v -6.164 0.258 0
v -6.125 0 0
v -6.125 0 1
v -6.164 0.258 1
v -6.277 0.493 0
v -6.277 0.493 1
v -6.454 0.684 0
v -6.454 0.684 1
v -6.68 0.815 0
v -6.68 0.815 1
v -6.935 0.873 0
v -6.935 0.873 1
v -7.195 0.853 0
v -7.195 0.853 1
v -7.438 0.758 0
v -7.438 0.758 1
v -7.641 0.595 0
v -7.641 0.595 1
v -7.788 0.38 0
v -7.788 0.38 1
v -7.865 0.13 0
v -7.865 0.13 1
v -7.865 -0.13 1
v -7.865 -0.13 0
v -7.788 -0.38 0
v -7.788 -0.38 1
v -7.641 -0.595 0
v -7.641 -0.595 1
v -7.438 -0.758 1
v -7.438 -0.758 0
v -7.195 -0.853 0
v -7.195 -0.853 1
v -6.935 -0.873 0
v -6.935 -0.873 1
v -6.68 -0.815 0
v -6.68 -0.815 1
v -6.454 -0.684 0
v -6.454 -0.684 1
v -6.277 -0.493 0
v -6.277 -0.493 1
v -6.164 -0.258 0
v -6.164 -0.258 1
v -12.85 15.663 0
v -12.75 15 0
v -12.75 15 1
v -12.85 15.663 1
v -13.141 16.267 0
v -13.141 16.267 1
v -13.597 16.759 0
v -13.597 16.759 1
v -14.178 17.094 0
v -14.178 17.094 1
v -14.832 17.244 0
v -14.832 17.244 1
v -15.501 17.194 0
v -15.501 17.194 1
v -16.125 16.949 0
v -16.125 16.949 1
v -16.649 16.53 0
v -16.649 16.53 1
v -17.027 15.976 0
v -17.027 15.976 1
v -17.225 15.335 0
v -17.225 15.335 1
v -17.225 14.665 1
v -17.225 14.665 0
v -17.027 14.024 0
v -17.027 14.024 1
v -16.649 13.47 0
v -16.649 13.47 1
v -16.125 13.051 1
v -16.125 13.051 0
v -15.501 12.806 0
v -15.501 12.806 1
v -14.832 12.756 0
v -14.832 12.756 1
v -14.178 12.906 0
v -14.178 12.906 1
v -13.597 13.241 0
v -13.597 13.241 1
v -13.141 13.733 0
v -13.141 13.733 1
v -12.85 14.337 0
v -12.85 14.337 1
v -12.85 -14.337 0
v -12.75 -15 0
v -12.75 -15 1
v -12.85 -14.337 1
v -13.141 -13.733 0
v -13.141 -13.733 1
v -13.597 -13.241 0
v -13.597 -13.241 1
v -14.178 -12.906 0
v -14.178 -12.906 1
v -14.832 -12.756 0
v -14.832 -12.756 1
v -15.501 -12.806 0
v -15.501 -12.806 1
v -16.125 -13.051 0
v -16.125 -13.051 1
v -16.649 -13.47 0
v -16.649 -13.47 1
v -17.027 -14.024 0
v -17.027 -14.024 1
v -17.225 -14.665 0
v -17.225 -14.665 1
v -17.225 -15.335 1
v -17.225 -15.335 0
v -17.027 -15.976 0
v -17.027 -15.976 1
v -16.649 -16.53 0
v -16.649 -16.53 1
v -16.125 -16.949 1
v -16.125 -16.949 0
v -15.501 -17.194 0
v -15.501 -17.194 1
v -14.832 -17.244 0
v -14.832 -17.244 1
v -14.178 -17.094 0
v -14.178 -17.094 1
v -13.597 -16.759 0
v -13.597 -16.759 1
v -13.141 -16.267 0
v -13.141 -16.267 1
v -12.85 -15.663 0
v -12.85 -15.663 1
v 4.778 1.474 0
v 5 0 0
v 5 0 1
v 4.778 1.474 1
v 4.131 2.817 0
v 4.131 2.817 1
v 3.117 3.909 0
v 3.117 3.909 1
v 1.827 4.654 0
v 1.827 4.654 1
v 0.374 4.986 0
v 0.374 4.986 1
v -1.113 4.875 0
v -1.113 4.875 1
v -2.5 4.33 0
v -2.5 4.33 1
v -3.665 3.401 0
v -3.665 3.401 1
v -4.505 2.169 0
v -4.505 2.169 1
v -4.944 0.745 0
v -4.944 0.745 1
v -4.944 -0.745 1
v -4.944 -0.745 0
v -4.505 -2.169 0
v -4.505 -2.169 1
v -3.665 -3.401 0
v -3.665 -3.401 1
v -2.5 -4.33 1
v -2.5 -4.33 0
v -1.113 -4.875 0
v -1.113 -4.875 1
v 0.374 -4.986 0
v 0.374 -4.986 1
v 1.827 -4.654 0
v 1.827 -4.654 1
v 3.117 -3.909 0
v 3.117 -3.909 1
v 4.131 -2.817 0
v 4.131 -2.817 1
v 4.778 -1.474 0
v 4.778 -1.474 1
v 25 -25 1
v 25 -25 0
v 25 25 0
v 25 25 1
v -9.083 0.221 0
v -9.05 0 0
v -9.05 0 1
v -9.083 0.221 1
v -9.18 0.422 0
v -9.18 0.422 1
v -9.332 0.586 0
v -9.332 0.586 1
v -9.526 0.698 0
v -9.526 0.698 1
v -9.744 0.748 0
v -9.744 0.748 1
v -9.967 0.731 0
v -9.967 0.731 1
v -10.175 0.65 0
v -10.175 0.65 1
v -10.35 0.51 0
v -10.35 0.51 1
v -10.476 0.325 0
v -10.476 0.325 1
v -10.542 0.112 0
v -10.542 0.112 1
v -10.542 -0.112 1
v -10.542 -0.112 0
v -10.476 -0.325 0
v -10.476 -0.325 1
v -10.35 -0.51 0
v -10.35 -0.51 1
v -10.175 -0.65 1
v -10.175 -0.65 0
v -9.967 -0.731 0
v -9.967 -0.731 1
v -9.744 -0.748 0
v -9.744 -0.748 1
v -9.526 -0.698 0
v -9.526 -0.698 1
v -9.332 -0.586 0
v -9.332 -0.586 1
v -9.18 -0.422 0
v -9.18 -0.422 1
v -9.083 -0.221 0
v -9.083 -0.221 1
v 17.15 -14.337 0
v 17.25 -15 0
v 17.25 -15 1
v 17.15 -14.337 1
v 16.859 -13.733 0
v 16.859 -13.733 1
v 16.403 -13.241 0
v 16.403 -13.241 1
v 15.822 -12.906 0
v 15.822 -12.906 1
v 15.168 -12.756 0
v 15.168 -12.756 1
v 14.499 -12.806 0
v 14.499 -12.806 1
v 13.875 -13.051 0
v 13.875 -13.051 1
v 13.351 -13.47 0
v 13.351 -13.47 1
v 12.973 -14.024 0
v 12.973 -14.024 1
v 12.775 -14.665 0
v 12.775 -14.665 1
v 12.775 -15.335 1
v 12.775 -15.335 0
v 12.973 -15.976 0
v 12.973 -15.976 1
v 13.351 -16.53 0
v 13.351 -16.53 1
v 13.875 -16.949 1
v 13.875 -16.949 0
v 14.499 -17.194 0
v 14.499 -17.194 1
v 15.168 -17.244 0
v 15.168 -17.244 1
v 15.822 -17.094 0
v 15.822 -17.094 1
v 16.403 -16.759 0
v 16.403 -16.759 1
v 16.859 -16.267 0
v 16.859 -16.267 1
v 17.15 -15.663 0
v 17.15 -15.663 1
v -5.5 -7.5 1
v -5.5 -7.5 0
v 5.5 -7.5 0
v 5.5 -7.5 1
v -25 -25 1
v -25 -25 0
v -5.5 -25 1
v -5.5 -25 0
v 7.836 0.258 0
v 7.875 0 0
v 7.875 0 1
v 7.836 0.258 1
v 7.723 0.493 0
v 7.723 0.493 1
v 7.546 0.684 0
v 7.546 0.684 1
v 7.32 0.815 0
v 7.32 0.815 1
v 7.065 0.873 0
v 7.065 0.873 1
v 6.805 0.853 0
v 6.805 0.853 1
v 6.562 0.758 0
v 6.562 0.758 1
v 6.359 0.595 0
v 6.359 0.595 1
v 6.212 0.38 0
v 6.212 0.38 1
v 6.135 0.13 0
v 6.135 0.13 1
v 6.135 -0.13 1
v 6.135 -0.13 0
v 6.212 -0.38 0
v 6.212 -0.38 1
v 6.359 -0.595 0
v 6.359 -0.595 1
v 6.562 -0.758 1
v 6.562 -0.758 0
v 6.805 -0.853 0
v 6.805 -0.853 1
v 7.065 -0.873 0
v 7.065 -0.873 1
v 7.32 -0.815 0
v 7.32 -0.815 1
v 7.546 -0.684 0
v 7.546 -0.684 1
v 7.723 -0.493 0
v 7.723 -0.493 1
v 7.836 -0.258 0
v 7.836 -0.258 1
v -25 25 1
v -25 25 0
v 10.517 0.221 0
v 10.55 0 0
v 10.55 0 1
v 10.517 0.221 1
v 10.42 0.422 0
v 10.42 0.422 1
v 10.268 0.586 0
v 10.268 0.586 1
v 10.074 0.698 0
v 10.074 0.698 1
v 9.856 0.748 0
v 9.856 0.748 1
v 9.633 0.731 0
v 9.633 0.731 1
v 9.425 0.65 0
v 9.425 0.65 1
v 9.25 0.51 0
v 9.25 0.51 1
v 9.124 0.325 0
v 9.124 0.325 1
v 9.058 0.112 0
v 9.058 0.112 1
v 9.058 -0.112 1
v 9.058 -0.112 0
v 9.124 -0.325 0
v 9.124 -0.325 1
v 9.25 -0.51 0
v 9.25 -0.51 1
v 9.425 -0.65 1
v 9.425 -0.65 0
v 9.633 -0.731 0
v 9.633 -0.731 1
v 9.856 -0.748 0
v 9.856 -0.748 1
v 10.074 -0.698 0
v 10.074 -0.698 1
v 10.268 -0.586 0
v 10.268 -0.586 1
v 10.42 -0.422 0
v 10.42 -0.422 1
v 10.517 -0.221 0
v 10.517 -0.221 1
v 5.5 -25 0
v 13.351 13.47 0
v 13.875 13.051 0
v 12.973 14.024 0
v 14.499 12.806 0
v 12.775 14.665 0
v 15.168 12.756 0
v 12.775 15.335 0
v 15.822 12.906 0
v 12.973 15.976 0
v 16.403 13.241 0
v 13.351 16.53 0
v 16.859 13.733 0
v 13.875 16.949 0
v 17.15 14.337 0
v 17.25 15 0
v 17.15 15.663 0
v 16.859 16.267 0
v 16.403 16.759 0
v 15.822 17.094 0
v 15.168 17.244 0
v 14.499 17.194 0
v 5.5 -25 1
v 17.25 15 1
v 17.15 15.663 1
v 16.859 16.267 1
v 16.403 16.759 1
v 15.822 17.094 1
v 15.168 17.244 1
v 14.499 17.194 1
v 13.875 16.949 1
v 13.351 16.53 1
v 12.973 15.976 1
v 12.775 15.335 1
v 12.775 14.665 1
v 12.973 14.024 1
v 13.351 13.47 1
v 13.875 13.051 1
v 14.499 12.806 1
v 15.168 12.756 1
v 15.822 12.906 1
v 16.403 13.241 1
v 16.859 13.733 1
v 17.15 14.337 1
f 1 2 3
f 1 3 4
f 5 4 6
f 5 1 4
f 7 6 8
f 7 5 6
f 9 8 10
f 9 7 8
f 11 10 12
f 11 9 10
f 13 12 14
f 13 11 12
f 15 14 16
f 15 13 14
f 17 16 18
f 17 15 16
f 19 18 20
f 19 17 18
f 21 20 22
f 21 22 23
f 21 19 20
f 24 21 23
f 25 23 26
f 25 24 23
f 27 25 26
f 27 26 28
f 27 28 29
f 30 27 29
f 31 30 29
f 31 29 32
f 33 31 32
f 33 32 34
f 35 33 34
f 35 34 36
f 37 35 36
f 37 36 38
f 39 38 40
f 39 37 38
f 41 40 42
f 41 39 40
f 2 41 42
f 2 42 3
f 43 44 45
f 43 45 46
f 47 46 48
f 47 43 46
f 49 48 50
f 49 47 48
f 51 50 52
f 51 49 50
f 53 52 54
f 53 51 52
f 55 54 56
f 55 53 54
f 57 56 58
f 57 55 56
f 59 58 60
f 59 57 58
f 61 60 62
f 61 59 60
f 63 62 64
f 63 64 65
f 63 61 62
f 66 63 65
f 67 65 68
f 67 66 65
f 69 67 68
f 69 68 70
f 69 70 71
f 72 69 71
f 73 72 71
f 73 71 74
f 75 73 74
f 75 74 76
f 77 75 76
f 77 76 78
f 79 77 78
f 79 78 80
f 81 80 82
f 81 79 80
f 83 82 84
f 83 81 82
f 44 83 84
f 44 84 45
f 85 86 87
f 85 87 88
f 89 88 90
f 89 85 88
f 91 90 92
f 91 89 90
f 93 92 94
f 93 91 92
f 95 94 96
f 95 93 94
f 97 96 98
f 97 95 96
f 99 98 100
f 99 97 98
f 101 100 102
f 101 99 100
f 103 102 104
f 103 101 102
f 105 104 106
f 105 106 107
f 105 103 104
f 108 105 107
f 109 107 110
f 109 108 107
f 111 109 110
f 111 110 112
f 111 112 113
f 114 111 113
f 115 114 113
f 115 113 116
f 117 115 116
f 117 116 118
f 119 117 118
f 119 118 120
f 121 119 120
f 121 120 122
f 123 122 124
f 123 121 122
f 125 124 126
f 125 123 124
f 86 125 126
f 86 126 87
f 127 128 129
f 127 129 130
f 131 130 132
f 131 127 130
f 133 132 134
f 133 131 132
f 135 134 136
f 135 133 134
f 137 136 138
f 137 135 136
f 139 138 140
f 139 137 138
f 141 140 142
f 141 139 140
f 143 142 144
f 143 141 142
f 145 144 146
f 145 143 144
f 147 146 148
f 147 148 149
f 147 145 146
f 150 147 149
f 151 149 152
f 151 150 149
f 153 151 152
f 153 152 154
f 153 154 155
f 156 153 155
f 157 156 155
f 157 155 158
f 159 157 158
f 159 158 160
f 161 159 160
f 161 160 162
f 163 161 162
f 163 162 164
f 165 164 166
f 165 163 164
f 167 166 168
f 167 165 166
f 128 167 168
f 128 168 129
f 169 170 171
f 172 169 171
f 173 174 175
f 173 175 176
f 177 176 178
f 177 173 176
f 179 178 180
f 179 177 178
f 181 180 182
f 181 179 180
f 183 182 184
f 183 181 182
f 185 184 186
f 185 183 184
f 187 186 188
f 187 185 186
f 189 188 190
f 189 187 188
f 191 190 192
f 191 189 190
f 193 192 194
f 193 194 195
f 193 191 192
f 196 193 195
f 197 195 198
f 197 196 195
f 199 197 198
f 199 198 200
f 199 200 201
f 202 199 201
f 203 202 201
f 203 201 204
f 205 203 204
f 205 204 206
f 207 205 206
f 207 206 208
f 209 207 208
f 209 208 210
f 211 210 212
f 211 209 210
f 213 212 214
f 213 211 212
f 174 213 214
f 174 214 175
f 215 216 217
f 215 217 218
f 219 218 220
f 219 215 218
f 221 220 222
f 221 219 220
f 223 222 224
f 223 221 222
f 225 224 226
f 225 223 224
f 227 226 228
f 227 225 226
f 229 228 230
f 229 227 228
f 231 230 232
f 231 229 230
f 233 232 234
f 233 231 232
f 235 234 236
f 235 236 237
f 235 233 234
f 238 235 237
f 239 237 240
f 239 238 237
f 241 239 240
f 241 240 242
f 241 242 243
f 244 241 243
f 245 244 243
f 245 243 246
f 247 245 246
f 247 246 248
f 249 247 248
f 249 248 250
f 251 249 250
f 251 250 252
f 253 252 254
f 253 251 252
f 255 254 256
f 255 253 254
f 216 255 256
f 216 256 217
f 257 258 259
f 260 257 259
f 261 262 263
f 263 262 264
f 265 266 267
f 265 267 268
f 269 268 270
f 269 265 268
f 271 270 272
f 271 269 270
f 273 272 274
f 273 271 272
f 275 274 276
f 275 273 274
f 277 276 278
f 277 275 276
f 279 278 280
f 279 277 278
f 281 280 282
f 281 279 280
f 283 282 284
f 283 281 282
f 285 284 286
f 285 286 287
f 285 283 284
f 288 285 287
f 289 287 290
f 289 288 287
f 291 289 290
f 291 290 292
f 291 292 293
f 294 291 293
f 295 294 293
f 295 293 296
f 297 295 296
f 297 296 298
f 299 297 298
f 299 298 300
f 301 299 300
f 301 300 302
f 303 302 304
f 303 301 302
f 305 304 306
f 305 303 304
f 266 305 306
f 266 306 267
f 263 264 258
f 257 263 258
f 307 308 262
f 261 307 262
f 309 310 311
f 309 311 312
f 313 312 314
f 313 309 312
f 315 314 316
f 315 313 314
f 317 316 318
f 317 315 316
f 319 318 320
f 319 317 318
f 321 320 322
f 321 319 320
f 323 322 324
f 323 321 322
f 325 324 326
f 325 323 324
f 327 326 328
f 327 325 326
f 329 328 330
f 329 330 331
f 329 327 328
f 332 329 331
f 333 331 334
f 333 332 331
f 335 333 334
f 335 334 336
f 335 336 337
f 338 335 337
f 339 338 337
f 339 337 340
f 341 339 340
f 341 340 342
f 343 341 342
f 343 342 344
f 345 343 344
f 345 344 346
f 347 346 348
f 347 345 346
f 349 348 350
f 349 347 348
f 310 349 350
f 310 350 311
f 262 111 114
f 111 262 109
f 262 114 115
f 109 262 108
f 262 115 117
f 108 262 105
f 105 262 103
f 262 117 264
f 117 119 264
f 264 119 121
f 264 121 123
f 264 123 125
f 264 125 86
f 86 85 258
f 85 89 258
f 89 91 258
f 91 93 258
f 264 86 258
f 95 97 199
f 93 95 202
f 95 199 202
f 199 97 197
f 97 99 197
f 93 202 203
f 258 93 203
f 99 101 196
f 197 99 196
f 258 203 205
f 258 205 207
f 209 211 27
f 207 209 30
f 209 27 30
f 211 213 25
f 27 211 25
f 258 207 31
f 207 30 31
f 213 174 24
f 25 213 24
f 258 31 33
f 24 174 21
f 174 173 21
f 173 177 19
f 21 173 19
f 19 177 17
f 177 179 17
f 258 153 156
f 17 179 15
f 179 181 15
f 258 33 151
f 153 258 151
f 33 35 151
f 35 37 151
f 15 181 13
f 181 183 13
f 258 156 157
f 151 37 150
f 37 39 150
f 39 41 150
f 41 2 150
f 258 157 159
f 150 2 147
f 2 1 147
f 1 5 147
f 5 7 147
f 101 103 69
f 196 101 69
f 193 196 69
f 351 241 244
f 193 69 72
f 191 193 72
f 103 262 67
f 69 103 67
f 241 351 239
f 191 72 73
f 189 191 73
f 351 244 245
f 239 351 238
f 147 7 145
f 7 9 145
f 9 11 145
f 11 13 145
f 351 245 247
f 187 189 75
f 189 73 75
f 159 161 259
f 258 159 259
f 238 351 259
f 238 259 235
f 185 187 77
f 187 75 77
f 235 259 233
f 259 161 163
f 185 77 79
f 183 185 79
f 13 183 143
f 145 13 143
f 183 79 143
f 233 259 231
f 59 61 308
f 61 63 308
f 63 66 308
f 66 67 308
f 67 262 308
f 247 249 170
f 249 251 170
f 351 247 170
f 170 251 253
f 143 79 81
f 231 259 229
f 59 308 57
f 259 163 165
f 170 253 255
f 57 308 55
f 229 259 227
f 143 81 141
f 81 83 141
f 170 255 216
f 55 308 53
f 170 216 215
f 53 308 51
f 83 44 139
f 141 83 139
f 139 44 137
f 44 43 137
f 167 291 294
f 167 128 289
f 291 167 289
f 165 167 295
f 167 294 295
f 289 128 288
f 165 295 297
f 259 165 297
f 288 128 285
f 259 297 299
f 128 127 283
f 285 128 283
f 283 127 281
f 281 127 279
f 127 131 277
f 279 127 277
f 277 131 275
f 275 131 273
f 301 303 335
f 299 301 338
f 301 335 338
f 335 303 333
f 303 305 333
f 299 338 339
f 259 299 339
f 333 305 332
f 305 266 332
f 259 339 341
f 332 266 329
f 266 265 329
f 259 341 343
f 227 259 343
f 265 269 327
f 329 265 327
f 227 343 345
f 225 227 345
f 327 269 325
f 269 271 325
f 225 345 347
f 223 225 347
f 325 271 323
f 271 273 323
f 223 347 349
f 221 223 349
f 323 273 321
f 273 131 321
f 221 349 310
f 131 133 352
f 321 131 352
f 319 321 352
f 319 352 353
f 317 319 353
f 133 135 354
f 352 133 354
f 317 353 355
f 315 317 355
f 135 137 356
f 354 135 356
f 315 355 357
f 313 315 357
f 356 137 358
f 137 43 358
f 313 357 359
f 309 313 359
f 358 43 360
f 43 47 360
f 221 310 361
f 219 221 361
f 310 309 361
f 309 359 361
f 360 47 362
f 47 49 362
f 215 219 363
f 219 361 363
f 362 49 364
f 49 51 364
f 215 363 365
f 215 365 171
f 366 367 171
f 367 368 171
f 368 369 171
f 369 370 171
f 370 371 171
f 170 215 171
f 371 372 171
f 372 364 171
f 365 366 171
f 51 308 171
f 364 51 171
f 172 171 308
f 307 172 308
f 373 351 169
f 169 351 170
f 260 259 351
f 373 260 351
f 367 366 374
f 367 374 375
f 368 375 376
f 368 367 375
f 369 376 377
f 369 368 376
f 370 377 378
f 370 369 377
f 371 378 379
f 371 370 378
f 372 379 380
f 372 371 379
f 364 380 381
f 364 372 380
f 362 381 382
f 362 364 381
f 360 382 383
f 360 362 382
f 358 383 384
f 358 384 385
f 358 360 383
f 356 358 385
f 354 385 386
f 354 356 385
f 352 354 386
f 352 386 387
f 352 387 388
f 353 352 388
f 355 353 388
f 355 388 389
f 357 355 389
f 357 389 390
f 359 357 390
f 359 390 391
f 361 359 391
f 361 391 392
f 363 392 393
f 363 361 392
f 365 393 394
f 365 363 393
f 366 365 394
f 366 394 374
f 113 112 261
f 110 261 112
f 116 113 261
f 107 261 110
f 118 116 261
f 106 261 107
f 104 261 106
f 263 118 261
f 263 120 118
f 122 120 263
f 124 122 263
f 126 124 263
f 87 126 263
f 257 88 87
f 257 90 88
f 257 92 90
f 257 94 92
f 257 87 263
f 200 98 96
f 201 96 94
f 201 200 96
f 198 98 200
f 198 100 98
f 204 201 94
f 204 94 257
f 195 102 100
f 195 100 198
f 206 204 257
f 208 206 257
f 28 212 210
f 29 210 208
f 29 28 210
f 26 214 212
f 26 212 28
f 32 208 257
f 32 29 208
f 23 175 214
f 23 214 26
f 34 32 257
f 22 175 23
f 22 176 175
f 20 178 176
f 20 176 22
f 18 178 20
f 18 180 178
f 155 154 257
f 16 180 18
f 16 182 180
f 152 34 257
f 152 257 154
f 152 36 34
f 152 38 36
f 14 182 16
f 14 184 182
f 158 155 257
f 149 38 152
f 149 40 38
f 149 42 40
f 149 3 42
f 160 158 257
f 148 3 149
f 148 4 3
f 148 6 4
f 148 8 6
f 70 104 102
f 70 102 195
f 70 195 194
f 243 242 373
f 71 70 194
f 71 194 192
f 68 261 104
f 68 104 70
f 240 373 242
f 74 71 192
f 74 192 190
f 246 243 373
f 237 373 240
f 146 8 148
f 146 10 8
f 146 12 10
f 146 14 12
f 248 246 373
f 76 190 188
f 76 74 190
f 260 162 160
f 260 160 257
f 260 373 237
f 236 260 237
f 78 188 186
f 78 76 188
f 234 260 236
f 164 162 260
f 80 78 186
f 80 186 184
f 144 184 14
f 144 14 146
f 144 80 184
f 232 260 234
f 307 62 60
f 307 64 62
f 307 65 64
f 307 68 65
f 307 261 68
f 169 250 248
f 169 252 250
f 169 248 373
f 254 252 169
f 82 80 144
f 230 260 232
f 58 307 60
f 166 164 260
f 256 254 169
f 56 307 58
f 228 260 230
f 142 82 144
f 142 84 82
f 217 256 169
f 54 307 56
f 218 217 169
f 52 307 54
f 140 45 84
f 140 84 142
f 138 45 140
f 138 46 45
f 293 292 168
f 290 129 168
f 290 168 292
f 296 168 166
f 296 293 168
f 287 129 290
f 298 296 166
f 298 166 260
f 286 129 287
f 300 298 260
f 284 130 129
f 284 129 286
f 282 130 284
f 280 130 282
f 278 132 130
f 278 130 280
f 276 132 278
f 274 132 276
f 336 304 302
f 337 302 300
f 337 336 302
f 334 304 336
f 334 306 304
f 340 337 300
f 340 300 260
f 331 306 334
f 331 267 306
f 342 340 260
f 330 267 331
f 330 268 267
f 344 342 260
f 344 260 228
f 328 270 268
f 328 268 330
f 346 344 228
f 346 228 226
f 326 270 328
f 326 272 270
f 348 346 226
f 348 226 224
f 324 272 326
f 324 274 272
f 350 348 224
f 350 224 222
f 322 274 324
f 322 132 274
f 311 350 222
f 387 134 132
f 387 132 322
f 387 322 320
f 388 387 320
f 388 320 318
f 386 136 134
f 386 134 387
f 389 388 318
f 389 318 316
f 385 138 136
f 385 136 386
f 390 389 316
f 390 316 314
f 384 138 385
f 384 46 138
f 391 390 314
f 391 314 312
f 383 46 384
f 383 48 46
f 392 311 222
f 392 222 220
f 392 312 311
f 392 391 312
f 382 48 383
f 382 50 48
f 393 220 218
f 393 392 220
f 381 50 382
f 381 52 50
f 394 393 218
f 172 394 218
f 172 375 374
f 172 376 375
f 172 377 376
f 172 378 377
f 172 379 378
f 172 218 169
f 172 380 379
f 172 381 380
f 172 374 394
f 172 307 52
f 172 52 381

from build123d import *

# Parameters (mm, degrees)
SKETCH1_R           = 2.25
SKETCH1_R_2         = 5
SKETCH1_R_3         = 0.75
SKETCH1_R_4         = 0.875
BOSS_EXTRUDE1_DEPTH = 1


with BuildPart() as part:
    # Sketch1 → Boss-Extrude1 (new body)
    with BuildSketch(Plane.XY):
        Polygon((-25, 25), (-25, -25), (-5.5, -25), (-5.5, -7.5), (5.5, -7.5), (5.5, -25), (25, -25), (25, 25), align=None)
        with Locations((-15, -15)):
            Circle(SKETCH1_R, mode=Mode.SUBTRACT)
        Circle(SKETCH1_R_2, mode=Mode.SUBTRACT)
        with Locations((15, -15)):
            Circle(SKETCH1_R, mode=Mode.SUBTRACT)
        with Locations((-9.8, 0)):
            Circle(SKETCH1_R_3, mode=Mode.SUBTRACT)
        with Locations((-7, 0)):
            Circle(SKETCH1_R_4, mode=Mode.SUBTRACT)
        with Locations((-15, 15)):
            Circle(SKETCH1_R, mode=Mode.SUBTRACT)
        with Locations((7, 0)):
            Circle(SKETCH1_R_4, mode=Mode.SUBTRACT)
        with Locations((9.8, 0)):
            Circle(SKETCH1_R_3, mode=Mode.SUBTRACT)
        with Locations((15, 15)):
            Circle(SKETCH1_R, mode=Mode.SUBTRACT)
    extrude(amount=BOSS_EXTRUDE1_DEPTH)


solid = part.part
